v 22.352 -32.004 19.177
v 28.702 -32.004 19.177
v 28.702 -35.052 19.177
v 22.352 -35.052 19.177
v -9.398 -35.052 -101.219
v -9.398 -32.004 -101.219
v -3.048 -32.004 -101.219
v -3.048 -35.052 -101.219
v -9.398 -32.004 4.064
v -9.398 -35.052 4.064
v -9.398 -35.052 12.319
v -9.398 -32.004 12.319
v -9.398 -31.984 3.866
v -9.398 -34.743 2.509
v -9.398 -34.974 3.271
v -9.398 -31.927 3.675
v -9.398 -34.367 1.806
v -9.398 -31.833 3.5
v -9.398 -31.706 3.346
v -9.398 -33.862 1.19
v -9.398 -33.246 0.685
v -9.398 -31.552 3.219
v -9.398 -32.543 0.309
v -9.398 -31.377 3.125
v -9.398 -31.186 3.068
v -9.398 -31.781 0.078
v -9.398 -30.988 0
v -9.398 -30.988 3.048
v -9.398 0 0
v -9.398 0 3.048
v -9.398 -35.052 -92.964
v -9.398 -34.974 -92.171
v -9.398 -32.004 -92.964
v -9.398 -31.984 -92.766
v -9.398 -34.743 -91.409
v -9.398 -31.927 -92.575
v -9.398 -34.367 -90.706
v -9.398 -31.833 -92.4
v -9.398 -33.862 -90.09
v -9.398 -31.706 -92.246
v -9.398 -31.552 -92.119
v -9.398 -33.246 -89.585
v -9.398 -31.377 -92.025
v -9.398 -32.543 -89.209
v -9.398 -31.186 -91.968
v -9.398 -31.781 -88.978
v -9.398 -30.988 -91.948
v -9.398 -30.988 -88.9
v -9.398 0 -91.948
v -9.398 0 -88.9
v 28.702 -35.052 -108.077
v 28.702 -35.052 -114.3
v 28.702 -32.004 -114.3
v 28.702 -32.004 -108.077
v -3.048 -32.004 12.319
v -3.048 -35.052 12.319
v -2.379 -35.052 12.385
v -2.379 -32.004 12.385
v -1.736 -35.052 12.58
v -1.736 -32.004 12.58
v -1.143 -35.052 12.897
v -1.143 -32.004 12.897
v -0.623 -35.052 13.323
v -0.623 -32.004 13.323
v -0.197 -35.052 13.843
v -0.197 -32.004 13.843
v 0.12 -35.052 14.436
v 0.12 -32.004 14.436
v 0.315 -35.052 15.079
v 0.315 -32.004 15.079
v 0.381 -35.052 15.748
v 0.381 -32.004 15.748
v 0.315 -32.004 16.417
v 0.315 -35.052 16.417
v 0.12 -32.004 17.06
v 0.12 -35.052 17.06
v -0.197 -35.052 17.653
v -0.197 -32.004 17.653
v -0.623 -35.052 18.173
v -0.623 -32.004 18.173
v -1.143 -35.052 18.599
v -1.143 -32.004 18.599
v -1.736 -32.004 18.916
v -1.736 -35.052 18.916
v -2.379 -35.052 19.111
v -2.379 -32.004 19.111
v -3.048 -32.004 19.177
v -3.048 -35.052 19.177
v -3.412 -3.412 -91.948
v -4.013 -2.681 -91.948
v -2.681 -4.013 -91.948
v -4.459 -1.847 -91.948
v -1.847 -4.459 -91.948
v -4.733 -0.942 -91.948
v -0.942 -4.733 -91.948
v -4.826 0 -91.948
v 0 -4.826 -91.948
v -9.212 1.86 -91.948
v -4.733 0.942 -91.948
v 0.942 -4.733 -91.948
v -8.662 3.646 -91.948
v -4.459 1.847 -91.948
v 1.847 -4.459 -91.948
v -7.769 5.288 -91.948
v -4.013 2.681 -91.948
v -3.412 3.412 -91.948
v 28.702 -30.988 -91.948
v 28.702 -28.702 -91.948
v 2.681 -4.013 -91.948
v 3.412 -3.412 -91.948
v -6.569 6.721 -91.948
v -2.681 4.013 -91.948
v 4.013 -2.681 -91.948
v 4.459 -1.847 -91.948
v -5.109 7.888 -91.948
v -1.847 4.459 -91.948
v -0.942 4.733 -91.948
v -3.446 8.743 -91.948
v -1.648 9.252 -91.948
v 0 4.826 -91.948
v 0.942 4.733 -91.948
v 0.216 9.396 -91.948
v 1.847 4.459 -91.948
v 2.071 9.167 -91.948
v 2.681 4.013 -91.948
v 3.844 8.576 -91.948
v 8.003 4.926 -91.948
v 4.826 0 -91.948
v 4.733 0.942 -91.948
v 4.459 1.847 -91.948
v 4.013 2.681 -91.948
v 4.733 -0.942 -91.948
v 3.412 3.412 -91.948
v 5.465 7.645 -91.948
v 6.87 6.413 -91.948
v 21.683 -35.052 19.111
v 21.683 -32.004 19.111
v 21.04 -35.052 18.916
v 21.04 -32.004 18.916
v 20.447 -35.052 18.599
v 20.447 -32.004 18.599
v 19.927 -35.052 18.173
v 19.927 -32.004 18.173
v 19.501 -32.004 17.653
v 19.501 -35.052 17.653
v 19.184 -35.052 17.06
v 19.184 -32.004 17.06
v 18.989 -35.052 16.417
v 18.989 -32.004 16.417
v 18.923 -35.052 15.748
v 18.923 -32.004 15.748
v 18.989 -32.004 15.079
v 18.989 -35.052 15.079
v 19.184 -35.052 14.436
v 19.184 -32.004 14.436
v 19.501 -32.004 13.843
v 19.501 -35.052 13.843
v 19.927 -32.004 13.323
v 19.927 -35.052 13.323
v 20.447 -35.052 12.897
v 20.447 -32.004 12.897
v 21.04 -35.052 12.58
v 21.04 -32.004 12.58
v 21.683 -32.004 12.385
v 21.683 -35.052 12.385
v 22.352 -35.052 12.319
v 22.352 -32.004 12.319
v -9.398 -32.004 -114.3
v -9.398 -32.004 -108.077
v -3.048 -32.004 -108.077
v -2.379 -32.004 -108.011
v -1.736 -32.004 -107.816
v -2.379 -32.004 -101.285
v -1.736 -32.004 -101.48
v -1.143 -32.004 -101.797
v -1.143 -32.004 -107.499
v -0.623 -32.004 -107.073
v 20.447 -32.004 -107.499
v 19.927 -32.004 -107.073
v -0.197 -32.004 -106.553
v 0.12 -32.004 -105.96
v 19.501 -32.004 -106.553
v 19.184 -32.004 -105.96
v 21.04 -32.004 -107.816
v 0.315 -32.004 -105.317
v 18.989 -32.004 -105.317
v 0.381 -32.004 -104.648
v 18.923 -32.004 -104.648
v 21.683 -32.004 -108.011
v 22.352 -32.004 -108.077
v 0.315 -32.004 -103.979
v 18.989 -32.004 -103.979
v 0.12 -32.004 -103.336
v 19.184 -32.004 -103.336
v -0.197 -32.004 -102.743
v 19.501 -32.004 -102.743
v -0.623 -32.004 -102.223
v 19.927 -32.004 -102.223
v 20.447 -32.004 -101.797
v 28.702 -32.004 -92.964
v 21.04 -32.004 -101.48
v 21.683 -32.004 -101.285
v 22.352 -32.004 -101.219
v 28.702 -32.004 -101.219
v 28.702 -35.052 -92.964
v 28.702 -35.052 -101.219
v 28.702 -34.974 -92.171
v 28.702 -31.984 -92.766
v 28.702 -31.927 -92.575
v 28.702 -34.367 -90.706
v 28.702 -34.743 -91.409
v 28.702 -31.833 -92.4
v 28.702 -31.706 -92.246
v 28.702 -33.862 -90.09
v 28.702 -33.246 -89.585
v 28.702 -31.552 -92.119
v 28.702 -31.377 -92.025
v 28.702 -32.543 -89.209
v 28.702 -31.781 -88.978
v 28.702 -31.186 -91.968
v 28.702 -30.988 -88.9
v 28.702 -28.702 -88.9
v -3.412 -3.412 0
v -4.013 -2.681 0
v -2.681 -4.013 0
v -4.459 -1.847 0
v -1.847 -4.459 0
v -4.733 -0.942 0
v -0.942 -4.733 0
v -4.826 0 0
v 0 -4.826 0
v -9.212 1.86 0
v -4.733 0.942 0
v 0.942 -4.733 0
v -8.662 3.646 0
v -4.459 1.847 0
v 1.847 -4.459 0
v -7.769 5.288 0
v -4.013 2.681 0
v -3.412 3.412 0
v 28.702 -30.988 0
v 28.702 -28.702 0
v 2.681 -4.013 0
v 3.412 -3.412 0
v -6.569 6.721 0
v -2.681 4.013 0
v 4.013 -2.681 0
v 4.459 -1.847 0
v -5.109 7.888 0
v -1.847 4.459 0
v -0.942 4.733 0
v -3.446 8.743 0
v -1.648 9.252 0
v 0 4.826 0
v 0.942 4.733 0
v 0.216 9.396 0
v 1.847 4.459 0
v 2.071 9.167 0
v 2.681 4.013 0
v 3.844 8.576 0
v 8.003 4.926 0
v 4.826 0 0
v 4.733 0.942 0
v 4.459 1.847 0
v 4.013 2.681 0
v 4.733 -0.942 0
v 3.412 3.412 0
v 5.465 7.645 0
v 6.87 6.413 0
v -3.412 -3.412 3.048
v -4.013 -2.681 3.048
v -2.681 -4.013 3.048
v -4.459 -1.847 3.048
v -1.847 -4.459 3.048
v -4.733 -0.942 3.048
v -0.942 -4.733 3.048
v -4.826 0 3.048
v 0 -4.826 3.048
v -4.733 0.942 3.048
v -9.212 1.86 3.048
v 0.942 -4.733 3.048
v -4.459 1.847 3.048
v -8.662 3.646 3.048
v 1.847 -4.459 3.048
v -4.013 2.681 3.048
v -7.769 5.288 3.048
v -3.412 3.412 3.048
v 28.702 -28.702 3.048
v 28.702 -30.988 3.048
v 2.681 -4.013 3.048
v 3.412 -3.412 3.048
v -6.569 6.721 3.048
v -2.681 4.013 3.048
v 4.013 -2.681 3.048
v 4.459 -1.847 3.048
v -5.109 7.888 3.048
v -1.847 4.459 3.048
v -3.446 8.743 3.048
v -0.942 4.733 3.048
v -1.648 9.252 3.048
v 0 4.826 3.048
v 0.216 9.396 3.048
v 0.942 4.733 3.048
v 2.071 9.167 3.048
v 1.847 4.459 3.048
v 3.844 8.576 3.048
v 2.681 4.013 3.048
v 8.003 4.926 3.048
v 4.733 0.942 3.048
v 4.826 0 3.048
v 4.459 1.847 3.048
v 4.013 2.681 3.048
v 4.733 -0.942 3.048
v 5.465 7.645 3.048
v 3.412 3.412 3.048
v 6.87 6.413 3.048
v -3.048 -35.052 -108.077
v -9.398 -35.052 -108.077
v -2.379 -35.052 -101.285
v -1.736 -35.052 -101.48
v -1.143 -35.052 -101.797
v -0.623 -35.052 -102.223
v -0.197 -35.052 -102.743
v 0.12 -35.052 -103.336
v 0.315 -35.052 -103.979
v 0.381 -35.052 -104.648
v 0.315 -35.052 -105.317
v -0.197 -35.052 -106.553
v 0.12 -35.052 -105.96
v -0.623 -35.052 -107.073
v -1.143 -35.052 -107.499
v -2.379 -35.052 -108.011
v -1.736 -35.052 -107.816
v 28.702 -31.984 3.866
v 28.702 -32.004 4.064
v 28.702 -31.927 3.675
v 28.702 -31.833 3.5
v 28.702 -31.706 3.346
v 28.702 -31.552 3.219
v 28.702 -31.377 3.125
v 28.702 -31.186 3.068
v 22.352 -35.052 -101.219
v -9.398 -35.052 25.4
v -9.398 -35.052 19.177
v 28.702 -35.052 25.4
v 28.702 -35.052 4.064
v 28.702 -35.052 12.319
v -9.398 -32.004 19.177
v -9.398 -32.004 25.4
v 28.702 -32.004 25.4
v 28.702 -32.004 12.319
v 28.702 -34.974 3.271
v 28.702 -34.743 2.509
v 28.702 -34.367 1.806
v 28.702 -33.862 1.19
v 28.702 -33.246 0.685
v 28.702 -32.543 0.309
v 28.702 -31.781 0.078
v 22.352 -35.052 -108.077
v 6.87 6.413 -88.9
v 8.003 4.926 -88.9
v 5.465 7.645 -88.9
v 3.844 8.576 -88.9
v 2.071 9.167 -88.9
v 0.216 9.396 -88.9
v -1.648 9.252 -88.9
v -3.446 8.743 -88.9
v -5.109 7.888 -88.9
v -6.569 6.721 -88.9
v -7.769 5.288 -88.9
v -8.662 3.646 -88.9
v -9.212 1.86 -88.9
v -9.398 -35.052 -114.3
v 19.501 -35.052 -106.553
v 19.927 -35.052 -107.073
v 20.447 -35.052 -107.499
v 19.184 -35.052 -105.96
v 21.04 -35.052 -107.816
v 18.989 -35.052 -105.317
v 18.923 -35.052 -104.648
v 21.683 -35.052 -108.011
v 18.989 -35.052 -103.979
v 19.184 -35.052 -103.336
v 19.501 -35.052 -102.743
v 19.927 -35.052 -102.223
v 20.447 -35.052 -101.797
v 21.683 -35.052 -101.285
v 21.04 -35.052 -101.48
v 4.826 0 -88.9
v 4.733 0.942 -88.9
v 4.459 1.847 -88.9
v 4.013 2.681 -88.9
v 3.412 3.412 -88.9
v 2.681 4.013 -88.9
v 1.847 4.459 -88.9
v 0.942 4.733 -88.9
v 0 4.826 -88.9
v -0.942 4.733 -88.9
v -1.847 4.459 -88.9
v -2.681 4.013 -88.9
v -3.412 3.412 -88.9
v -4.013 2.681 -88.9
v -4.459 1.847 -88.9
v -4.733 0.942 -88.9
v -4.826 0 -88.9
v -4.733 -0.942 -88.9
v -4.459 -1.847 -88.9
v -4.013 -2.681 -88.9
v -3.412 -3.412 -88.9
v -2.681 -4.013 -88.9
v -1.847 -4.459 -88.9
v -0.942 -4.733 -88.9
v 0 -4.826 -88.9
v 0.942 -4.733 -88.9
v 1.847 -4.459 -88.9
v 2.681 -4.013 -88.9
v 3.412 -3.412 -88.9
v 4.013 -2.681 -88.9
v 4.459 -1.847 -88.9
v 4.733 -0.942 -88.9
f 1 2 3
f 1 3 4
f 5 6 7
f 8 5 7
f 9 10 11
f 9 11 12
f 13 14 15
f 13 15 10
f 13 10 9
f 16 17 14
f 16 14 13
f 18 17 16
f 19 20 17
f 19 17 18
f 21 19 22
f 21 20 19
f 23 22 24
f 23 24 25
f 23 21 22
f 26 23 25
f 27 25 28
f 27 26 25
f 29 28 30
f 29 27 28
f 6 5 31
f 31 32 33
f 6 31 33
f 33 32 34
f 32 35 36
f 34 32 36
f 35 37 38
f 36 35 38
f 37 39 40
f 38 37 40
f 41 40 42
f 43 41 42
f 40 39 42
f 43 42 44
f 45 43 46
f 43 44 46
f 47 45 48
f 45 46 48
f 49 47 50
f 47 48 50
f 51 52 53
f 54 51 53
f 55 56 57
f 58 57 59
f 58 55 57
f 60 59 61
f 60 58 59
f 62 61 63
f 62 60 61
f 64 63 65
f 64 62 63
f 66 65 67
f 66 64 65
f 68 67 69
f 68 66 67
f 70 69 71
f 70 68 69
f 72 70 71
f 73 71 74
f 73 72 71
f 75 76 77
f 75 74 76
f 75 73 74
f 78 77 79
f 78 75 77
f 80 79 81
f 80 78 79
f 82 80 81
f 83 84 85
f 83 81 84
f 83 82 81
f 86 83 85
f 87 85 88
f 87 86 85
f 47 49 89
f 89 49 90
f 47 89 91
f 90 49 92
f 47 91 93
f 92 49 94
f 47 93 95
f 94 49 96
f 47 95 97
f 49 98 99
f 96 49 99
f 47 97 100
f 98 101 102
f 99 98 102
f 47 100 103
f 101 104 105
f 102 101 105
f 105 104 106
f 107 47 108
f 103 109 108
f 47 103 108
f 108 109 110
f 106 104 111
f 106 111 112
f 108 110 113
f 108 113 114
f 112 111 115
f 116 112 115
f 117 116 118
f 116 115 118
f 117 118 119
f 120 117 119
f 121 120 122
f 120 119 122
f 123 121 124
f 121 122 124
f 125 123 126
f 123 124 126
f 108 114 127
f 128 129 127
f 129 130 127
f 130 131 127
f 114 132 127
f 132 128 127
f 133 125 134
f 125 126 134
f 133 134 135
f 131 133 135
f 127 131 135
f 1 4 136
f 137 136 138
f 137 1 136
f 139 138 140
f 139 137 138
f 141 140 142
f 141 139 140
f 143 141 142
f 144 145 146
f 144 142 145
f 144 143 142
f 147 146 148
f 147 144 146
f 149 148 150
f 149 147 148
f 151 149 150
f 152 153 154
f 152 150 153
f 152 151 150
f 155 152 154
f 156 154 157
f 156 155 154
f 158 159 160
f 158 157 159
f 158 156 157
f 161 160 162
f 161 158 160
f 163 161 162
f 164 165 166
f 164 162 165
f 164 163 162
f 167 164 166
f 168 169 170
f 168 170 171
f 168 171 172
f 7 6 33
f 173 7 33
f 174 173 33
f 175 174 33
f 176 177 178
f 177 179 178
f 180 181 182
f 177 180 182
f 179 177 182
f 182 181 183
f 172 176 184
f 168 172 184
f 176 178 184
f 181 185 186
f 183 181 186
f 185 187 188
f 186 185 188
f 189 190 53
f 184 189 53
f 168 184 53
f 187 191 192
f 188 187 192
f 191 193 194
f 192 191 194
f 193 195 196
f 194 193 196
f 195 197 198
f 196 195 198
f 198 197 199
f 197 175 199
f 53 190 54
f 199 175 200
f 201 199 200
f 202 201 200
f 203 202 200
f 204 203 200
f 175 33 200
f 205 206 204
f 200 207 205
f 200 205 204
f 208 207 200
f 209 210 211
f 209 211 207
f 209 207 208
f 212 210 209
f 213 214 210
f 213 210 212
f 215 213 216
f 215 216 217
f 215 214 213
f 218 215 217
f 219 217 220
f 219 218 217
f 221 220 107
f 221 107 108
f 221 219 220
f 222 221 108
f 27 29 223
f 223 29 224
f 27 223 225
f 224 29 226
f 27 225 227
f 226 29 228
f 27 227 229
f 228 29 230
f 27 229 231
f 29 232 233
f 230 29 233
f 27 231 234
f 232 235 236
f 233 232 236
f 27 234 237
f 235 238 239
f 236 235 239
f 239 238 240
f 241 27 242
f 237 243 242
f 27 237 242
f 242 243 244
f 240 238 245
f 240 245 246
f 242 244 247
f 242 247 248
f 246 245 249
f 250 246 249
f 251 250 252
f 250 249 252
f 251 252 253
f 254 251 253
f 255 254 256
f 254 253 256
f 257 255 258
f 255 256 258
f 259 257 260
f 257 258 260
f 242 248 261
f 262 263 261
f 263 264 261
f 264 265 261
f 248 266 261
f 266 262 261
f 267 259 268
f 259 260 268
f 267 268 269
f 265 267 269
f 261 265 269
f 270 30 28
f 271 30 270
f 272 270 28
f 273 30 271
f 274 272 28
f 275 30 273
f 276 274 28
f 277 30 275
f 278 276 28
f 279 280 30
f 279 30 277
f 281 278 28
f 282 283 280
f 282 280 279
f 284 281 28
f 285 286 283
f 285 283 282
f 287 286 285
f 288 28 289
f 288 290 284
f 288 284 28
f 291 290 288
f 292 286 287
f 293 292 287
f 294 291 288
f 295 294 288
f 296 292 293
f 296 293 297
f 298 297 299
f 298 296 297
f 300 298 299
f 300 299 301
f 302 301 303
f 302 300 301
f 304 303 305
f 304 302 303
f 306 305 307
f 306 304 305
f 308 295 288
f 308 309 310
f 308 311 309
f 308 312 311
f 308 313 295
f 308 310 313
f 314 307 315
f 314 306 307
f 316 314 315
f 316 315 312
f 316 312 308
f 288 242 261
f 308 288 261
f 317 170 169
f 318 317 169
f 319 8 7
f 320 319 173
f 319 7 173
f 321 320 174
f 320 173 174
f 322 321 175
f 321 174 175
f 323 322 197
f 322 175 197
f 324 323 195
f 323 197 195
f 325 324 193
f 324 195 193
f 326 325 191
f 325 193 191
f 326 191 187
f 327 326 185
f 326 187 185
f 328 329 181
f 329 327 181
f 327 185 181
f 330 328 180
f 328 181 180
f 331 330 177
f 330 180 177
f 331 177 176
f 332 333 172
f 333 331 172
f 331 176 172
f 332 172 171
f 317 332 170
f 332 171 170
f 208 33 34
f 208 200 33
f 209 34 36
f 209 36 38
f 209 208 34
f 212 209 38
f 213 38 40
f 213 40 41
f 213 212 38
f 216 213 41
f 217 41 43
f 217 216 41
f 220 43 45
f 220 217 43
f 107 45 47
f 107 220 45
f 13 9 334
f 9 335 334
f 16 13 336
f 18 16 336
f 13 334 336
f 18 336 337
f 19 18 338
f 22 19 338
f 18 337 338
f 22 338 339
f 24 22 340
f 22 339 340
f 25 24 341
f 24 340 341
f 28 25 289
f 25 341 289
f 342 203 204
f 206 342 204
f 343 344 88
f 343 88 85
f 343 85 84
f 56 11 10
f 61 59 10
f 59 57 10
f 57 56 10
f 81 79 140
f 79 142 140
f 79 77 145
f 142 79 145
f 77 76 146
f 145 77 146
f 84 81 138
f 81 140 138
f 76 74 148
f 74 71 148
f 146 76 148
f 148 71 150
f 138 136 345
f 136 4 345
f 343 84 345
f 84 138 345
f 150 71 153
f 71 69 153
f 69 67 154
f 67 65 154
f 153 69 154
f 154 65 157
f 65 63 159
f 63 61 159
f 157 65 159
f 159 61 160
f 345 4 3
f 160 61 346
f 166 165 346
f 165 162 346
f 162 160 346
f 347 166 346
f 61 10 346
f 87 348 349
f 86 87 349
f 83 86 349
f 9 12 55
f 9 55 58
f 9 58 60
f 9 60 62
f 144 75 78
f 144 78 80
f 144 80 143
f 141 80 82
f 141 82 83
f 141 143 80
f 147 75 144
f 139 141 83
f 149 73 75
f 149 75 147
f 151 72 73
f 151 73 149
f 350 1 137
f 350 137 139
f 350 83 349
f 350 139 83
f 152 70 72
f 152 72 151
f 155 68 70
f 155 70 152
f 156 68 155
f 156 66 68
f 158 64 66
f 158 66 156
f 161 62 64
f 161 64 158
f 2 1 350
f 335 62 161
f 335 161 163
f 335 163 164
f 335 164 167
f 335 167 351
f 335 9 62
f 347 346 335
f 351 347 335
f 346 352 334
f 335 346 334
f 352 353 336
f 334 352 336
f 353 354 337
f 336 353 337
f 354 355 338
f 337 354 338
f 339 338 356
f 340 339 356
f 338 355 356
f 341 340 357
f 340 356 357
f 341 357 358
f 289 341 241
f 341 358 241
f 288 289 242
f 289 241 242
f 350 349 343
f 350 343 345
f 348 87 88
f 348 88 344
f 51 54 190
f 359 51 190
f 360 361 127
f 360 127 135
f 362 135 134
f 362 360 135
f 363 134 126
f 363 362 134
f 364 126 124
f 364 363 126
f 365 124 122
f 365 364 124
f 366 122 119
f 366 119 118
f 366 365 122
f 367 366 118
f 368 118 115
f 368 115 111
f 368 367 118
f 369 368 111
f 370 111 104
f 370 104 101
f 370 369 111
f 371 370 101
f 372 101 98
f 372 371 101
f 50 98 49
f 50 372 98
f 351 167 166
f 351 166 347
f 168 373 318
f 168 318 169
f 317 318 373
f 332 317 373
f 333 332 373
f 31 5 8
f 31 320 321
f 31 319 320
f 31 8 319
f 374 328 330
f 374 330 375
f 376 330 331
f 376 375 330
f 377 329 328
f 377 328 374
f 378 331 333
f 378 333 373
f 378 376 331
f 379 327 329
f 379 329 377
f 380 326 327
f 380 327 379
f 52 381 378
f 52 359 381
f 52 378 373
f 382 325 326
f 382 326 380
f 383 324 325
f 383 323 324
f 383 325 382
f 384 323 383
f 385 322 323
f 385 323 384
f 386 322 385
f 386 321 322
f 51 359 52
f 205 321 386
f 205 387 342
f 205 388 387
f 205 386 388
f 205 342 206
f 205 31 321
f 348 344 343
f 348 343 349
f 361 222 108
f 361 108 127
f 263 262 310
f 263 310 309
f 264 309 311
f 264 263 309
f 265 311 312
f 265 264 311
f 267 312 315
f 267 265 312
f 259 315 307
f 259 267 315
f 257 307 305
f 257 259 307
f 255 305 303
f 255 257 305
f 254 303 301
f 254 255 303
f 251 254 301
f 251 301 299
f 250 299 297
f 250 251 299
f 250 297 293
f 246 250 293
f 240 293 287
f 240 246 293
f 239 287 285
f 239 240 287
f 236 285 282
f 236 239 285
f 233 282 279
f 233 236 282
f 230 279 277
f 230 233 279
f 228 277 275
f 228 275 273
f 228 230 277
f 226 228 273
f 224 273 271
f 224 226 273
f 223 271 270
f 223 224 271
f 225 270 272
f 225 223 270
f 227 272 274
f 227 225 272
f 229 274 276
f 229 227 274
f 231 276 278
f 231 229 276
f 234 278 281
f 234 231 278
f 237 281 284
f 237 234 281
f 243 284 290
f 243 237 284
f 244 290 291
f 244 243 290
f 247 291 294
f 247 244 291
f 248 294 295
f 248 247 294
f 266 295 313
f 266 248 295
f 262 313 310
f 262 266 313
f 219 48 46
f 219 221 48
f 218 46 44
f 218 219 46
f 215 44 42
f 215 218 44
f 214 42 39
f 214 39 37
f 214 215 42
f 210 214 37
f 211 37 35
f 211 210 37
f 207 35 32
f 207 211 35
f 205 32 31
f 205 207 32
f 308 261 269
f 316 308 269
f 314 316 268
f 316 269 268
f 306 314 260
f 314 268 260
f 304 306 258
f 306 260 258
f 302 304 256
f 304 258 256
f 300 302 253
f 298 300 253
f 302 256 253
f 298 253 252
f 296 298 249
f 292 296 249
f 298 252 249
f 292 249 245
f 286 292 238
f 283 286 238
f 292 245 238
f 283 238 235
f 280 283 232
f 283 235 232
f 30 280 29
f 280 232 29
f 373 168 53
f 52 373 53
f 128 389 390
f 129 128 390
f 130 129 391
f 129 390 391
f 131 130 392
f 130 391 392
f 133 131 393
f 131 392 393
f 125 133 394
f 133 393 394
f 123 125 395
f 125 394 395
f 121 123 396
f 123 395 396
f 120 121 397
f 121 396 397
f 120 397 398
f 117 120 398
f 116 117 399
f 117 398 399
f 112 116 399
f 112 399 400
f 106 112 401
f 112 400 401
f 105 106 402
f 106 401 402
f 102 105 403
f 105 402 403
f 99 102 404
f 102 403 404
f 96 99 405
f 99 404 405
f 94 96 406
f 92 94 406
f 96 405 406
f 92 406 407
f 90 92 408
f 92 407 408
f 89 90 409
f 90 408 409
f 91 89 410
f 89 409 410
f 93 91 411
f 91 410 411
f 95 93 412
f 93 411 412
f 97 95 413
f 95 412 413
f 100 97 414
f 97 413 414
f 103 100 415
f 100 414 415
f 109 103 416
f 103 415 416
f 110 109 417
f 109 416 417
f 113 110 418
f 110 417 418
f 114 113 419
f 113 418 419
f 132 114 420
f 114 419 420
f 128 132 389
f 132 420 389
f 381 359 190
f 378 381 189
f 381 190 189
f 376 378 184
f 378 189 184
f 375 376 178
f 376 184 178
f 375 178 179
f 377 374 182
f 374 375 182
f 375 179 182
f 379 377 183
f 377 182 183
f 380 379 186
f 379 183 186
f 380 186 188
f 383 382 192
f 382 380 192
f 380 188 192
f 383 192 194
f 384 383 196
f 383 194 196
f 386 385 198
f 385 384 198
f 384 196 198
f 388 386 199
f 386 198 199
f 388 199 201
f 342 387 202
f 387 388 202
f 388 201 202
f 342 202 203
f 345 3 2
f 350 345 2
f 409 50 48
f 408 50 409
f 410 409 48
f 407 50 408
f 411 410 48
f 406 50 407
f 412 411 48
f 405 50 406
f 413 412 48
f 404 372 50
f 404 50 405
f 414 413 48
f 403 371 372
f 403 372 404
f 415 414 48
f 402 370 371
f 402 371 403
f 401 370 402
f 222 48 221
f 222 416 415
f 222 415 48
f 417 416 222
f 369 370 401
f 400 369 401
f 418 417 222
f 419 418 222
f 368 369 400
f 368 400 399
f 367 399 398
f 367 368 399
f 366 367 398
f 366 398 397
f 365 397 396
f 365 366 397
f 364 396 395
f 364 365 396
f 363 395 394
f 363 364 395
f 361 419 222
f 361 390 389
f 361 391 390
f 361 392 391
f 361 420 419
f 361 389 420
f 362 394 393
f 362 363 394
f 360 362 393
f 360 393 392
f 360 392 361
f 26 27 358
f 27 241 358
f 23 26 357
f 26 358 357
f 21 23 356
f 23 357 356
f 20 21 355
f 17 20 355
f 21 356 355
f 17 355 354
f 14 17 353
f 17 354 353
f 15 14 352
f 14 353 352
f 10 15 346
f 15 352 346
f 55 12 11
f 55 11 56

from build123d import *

# Parameters (mm, degrees)
SKETCH3_R           = 4.826
BOSS_EXTRUDE1_DEPTH = 3.048
SKETCH4_W           = 38.1
SKETCH4_H           = 3.048
BOSS_EXTRUDE2_DEPTH = 22.352
CUT_EXTRUDE1_DEPTH  = 4.048
FILLET1_R           = 1.016
FILLET2_R           = 4.064


with BuildPart() as part:
    # Sketch3 → Boss-Extrude1 (new body)
    with BuildSketch(Plane.XY):
        with BuildLine():
            Line((-9.398, 0), (-9.398, -35.052))
            Line((-9.398, -35.052), (28.702, -35.052))
            Line((28.702, -35.052), (28.702, -28.702))
            Line((28.702, -28.702), (8.003429206, 4.926207967))
            ThreePointArc((8.003429206, 4.926207967), (-2.559900029, 9.042638765), (-9.398, 0))
        make_face()
        Circle(SKETCH3_R, mode=Mode.SUBTRACT)
    extrude(amount=BOSS_EXTRUDE1_DEPTH)

    # Sketch4 → Boss-Extrude2 (add)
    with BuildSketch(Plane.XY.offset(3.048)):
        with Locations((9.652, -33.528)):
            Rectangle(SKETCH4_W, SKETCH4_H)
    extrude(amount=BOSS_EXTRUDE2_DEPTH)

    # Sketch5 → Cut-Extrude1 (cut, through all)
    with BuildSketch(Plane(origin=(0, -32.004, 0), x_dir=(1, 0, 0), z_dir=(0, 1, 0))):
        with BuildLine():
            Line((-3.048, -19.177), (-9.398, -19.177))
            Line((-9.398, -19.177), (-9.398, -12.319))
            Line((-9.398, -12.319), (-3.048, -12.319))
            ThreePointArc((-3.048, -12.319), (0.381, -15.748), (-3.048, -19.177))
        make_face()
        with BuildLine():
            Line((22.352, -12.319), (28.702, -12.319))
            Line((28.702, -12.319), (28.702, -19.177))
            Line((28.702, -19.177), (22.352, -19.177))
            ThreePointArc((22.352, -19.177), (18.923, -15.748), (22.352, -12.319))
        make_face()
    extrude(amount=-CUT_EXTRUDE1_DEPTH, mode=Mode.SUBTRACT)

    # Fillet1
    fillet1_edges = [part.edges().sort_by_distance(p)[0] for p in [
        (9.652, -32.004, 3.048),
    ]]
    fillet(fillet1_edges, radius=FILLET1_R)

    # Fillet2
    fillet2_edges = [part.edges().sort_by_distance(p)[0] for p in [
        (9.652, -35.052, 0),
    ]]
    fillet(fillet2_edges, radius=FILLET2_R)


with BuildPart() as body_2:
    # Mirror2: mirrored copy
    add(part.part.mirror(Plane.XY.offset(-44.45)))


solid = Compound([part.part, body_2.part])
